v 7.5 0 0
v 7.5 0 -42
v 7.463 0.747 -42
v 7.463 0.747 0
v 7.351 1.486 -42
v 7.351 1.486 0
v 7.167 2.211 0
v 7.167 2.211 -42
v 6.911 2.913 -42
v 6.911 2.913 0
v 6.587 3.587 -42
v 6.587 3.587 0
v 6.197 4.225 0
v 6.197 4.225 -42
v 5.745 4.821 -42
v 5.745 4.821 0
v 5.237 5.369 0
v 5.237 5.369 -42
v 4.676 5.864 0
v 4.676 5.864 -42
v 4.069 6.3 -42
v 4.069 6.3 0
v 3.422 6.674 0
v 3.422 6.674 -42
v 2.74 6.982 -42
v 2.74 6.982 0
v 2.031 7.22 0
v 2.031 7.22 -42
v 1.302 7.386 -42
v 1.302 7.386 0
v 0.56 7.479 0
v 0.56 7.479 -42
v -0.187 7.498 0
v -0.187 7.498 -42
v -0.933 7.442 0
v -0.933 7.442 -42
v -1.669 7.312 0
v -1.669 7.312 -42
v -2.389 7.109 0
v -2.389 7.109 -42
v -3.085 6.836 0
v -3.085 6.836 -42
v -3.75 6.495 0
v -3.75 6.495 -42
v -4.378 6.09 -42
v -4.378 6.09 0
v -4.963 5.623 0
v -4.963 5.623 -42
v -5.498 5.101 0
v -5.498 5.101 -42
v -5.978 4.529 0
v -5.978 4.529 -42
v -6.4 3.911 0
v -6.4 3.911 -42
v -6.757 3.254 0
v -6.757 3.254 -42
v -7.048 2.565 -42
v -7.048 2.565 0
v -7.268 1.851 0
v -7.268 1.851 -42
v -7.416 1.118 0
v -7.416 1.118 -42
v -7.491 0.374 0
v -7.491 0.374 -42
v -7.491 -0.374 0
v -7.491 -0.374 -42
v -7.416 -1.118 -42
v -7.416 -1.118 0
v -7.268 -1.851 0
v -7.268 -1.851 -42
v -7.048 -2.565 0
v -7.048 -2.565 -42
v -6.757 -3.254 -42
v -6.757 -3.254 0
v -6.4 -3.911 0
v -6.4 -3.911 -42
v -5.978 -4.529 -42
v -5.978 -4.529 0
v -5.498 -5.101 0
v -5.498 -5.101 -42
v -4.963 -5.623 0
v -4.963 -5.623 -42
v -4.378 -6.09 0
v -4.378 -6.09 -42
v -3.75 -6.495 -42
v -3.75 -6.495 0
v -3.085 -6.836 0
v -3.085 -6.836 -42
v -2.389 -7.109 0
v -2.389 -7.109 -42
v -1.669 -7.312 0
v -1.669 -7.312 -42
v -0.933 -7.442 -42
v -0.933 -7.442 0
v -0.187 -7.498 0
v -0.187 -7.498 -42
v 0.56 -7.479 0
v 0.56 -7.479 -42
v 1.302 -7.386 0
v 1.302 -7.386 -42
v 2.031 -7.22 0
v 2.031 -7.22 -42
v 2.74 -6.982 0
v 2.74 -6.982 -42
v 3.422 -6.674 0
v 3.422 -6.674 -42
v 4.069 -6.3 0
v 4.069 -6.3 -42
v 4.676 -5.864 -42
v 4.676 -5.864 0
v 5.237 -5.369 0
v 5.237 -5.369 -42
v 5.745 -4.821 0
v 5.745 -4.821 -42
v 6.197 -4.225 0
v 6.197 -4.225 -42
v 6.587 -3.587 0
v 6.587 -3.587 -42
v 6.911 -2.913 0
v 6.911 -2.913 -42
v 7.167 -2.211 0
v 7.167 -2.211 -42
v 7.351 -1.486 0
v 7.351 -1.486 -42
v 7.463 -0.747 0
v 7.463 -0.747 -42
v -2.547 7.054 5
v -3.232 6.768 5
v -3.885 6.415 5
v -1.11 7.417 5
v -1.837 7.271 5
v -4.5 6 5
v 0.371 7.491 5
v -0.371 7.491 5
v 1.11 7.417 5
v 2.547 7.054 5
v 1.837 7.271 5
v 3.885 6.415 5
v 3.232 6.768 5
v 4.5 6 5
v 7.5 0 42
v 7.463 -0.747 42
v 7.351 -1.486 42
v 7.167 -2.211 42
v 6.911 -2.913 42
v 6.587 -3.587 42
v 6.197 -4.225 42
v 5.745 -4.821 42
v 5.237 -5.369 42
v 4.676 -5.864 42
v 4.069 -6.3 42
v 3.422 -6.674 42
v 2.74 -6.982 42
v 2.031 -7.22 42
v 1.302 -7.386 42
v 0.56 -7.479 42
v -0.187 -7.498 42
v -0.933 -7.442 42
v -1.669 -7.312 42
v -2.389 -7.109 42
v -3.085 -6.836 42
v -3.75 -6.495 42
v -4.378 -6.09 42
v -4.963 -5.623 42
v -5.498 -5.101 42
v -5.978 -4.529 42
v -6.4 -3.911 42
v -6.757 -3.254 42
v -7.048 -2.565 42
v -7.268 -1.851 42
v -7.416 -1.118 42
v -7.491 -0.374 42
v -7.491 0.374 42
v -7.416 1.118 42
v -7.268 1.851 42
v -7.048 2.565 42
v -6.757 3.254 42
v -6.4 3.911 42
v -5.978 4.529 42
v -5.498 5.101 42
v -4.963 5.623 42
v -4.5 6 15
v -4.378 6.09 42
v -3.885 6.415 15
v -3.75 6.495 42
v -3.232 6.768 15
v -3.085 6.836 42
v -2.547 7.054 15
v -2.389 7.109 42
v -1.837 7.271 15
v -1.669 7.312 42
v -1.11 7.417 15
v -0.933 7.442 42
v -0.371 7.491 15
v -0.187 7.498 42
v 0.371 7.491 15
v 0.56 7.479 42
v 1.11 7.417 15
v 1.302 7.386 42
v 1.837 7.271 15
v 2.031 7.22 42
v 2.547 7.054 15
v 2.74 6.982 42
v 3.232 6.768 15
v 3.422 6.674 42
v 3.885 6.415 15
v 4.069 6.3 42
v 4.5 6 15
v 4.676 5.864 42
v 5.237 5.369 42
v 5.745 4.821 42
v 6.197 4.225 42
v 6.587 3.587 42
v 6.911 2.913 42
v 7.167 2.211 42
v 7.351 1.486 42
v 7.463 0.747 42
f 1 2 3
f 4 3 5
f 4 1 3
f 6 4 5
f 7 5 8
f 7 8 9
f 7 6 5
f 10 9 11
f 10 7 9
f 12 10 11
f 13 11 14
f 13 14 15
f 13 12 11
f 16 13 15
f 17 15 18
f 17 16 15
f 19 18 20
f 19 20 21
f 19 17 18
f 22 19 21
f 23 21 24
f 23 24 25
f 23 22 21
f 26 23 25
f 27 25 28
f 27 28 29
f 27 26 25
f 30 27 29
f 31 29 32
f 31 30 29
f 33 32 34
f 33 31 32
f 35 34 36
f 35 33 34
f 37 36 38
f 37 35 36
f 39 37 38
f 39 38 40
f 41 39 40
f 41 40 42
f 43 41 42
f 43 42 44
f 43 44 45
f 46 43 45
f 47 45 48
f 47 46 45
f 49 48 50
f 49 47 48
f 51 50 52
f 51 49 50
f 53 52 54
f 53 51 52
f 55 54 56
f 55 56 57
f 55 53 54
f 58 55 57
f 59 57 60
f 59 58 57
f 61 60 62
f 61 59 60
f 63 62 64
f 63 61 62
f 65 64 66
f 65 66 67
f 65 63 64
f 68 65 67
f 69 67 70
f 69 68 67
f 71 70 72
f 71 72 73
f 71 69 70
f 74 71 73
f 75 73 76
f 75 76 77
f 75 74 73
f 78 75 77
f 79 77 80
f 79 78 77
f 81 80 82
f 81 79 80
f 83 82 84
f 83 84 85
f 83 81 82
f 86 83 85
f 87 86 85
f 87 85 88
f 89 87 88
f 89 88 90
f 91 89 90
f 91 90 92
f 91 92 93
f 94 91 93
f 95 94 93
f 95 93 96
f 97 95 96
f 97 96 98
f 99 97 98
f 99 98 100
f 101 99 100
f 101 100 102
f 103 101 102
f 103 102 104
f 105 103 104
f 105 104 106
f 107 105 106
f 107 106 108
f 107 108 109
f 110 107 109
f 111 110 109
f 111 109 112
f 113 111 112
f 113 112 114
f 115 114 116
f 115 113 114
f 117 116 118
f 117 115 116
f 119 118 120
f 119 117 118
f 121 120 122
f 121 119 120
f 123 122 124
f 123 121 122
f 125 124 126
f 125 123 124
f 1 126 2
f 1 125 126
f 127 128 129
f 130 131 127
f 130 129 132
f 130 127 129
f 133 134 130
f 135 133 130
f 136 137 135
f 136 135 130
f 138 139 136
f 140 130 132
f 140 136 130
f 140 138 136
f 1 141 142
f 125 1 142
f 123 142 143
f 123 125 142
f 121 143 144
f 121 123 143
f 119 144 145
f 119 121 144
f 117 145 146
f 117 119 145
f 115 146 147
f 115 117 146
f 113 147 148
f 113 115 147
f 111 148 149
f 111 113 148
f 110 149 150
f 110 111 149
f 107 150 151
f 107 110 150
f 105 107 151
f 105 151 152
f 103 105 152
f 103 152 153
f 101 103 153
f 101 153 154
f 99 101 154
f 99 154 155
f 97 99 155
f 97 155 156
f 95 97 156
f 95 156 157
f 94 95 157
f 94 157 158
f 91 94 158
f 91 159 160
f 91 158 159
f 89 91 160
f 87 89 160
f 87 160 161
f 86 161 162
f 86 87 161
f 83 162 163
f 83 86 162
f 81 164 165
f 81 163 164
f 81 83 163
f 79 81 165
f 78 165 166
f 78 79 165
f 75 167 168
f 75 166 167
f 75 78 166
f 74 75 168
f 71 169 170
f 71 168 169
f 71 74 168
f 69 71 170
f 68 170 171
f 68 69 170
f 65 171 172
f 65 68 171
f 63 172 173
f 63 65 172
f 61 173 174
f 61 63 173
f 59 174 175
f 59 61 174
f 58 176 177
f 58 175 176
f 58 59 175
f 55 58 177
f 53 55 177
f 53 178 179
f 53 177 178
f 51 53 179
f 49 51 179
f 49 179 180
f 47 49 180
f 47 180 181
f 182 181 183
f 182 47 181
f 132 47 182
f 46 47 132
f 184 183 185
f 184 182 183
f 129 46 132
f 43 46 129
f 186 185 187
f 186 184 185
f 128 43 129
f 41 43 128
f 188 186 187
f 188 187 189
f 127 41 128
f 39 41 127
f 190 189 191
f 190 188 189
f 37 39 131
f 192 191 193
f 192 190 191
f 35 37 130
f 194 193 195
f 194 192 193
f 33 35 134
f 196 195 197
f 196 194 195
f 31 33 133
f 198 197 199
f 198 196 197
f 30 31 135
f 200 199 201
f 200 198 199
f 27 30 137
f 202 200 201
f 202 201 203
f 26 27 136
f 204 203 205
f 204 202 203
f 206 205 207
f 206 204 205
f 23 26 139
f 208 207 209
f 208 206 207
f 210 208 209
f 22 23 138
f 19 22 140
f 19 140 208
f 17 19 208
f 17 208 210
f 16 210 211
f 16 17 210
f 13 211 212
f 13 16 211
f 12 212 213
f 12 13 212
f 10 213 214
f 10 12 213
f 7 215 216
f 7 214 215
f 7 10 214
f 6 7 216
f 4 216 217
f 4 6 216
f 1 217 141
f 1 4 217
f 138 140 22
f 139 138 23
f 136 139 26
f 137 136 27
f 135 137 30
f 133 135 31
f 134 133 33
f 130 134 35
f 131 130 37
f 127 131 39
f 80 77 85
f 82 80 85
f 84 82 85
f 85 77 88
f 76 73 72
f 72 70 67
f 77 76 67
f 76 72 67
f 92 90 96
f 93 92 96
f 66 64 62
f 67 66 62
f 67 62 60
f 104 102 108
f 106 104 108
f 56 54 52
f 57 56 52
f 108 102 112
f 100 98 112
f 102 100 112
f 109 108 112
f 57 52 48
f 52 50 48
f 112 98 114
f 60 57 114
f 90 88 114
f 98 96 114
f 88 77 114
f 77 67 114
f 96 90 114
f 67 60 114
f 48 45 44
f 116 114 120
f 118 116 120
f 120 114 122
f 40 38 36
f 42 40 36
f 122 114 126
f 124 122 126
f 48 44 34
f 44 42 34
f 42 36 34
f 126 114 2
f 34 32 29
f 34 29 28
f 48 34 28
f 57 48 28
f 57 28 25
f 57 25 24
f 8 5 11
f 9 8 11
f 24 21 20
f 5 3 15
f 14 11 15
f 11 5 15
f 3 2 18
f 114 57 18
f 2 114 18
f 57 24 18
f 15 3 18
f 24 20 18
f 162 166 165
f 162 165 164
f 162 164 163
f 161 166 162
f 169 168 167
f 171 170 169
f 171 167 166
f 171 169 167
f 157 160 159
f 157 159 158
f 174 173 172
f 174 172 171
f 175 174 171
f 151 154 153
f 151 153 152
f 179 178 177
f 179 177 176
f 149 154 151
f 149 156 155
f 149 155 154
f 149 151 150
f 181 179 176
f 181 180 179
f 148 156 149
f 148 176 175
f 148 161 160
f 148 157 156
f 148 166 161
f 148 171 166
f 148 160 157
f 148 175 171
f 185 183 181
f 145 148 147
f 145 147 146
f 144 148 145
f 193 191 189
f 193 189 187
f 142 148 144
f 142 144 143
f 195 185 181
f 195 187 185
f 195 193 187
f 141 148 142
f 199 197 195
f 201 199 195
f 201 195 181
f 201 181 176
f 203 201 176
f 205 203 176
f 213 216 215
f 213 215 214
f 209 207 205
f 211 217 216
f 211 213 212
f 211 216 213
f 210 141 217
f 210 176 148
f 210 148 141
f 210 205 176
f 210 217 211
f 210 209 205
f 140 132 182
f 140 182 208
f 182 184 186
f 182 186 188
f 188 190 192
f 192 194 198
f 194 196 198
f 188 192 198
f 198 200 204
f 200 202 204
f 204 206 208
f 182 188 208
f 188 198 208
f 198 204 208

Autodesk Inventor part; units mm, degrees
ref_plane "YZ Plane" through (0, 0, 0) normal (1, 0, 0) x (0, 1, 0)
ref_plane "XZ Plane" through (0, 0, 0) normal (0, 1, 0) x (-1, 0, 0)
sketch "Boceto1" plane through (0, 0, 0) normal (0, 0, 1) x (1, 0, 0)
  circle A0 centre (0, 0) radius 7.5
  dimension "d0" = 15
extrude "Extrusión1" add sketch "Boceto1" along normal mid plane 84
ref_plane "Plano de trabajo1" through (0, 0, 5) normal (0, 0, 1) x (1, 0, 0)
sketch "Boceto3" plane through (0, 0, 5) normal (0, 0, 1) x (1, 0, 0)
  circle A0 centre (0, 0) radius 7.5 projected
  line L0 (0, 7.5) -> (0, 6)
  line L1 (0, 6) -> (4.5, 6)
  line L2 (0, 6) -> (-4.5, 6)
  dimension "d4" = 1.5
extrude "Extrusión2" cut sketch "Boceto3" along normal blind 10 contours L1 L0 A0 | A0 L0 L2
properties part number "Eje_engrane"
